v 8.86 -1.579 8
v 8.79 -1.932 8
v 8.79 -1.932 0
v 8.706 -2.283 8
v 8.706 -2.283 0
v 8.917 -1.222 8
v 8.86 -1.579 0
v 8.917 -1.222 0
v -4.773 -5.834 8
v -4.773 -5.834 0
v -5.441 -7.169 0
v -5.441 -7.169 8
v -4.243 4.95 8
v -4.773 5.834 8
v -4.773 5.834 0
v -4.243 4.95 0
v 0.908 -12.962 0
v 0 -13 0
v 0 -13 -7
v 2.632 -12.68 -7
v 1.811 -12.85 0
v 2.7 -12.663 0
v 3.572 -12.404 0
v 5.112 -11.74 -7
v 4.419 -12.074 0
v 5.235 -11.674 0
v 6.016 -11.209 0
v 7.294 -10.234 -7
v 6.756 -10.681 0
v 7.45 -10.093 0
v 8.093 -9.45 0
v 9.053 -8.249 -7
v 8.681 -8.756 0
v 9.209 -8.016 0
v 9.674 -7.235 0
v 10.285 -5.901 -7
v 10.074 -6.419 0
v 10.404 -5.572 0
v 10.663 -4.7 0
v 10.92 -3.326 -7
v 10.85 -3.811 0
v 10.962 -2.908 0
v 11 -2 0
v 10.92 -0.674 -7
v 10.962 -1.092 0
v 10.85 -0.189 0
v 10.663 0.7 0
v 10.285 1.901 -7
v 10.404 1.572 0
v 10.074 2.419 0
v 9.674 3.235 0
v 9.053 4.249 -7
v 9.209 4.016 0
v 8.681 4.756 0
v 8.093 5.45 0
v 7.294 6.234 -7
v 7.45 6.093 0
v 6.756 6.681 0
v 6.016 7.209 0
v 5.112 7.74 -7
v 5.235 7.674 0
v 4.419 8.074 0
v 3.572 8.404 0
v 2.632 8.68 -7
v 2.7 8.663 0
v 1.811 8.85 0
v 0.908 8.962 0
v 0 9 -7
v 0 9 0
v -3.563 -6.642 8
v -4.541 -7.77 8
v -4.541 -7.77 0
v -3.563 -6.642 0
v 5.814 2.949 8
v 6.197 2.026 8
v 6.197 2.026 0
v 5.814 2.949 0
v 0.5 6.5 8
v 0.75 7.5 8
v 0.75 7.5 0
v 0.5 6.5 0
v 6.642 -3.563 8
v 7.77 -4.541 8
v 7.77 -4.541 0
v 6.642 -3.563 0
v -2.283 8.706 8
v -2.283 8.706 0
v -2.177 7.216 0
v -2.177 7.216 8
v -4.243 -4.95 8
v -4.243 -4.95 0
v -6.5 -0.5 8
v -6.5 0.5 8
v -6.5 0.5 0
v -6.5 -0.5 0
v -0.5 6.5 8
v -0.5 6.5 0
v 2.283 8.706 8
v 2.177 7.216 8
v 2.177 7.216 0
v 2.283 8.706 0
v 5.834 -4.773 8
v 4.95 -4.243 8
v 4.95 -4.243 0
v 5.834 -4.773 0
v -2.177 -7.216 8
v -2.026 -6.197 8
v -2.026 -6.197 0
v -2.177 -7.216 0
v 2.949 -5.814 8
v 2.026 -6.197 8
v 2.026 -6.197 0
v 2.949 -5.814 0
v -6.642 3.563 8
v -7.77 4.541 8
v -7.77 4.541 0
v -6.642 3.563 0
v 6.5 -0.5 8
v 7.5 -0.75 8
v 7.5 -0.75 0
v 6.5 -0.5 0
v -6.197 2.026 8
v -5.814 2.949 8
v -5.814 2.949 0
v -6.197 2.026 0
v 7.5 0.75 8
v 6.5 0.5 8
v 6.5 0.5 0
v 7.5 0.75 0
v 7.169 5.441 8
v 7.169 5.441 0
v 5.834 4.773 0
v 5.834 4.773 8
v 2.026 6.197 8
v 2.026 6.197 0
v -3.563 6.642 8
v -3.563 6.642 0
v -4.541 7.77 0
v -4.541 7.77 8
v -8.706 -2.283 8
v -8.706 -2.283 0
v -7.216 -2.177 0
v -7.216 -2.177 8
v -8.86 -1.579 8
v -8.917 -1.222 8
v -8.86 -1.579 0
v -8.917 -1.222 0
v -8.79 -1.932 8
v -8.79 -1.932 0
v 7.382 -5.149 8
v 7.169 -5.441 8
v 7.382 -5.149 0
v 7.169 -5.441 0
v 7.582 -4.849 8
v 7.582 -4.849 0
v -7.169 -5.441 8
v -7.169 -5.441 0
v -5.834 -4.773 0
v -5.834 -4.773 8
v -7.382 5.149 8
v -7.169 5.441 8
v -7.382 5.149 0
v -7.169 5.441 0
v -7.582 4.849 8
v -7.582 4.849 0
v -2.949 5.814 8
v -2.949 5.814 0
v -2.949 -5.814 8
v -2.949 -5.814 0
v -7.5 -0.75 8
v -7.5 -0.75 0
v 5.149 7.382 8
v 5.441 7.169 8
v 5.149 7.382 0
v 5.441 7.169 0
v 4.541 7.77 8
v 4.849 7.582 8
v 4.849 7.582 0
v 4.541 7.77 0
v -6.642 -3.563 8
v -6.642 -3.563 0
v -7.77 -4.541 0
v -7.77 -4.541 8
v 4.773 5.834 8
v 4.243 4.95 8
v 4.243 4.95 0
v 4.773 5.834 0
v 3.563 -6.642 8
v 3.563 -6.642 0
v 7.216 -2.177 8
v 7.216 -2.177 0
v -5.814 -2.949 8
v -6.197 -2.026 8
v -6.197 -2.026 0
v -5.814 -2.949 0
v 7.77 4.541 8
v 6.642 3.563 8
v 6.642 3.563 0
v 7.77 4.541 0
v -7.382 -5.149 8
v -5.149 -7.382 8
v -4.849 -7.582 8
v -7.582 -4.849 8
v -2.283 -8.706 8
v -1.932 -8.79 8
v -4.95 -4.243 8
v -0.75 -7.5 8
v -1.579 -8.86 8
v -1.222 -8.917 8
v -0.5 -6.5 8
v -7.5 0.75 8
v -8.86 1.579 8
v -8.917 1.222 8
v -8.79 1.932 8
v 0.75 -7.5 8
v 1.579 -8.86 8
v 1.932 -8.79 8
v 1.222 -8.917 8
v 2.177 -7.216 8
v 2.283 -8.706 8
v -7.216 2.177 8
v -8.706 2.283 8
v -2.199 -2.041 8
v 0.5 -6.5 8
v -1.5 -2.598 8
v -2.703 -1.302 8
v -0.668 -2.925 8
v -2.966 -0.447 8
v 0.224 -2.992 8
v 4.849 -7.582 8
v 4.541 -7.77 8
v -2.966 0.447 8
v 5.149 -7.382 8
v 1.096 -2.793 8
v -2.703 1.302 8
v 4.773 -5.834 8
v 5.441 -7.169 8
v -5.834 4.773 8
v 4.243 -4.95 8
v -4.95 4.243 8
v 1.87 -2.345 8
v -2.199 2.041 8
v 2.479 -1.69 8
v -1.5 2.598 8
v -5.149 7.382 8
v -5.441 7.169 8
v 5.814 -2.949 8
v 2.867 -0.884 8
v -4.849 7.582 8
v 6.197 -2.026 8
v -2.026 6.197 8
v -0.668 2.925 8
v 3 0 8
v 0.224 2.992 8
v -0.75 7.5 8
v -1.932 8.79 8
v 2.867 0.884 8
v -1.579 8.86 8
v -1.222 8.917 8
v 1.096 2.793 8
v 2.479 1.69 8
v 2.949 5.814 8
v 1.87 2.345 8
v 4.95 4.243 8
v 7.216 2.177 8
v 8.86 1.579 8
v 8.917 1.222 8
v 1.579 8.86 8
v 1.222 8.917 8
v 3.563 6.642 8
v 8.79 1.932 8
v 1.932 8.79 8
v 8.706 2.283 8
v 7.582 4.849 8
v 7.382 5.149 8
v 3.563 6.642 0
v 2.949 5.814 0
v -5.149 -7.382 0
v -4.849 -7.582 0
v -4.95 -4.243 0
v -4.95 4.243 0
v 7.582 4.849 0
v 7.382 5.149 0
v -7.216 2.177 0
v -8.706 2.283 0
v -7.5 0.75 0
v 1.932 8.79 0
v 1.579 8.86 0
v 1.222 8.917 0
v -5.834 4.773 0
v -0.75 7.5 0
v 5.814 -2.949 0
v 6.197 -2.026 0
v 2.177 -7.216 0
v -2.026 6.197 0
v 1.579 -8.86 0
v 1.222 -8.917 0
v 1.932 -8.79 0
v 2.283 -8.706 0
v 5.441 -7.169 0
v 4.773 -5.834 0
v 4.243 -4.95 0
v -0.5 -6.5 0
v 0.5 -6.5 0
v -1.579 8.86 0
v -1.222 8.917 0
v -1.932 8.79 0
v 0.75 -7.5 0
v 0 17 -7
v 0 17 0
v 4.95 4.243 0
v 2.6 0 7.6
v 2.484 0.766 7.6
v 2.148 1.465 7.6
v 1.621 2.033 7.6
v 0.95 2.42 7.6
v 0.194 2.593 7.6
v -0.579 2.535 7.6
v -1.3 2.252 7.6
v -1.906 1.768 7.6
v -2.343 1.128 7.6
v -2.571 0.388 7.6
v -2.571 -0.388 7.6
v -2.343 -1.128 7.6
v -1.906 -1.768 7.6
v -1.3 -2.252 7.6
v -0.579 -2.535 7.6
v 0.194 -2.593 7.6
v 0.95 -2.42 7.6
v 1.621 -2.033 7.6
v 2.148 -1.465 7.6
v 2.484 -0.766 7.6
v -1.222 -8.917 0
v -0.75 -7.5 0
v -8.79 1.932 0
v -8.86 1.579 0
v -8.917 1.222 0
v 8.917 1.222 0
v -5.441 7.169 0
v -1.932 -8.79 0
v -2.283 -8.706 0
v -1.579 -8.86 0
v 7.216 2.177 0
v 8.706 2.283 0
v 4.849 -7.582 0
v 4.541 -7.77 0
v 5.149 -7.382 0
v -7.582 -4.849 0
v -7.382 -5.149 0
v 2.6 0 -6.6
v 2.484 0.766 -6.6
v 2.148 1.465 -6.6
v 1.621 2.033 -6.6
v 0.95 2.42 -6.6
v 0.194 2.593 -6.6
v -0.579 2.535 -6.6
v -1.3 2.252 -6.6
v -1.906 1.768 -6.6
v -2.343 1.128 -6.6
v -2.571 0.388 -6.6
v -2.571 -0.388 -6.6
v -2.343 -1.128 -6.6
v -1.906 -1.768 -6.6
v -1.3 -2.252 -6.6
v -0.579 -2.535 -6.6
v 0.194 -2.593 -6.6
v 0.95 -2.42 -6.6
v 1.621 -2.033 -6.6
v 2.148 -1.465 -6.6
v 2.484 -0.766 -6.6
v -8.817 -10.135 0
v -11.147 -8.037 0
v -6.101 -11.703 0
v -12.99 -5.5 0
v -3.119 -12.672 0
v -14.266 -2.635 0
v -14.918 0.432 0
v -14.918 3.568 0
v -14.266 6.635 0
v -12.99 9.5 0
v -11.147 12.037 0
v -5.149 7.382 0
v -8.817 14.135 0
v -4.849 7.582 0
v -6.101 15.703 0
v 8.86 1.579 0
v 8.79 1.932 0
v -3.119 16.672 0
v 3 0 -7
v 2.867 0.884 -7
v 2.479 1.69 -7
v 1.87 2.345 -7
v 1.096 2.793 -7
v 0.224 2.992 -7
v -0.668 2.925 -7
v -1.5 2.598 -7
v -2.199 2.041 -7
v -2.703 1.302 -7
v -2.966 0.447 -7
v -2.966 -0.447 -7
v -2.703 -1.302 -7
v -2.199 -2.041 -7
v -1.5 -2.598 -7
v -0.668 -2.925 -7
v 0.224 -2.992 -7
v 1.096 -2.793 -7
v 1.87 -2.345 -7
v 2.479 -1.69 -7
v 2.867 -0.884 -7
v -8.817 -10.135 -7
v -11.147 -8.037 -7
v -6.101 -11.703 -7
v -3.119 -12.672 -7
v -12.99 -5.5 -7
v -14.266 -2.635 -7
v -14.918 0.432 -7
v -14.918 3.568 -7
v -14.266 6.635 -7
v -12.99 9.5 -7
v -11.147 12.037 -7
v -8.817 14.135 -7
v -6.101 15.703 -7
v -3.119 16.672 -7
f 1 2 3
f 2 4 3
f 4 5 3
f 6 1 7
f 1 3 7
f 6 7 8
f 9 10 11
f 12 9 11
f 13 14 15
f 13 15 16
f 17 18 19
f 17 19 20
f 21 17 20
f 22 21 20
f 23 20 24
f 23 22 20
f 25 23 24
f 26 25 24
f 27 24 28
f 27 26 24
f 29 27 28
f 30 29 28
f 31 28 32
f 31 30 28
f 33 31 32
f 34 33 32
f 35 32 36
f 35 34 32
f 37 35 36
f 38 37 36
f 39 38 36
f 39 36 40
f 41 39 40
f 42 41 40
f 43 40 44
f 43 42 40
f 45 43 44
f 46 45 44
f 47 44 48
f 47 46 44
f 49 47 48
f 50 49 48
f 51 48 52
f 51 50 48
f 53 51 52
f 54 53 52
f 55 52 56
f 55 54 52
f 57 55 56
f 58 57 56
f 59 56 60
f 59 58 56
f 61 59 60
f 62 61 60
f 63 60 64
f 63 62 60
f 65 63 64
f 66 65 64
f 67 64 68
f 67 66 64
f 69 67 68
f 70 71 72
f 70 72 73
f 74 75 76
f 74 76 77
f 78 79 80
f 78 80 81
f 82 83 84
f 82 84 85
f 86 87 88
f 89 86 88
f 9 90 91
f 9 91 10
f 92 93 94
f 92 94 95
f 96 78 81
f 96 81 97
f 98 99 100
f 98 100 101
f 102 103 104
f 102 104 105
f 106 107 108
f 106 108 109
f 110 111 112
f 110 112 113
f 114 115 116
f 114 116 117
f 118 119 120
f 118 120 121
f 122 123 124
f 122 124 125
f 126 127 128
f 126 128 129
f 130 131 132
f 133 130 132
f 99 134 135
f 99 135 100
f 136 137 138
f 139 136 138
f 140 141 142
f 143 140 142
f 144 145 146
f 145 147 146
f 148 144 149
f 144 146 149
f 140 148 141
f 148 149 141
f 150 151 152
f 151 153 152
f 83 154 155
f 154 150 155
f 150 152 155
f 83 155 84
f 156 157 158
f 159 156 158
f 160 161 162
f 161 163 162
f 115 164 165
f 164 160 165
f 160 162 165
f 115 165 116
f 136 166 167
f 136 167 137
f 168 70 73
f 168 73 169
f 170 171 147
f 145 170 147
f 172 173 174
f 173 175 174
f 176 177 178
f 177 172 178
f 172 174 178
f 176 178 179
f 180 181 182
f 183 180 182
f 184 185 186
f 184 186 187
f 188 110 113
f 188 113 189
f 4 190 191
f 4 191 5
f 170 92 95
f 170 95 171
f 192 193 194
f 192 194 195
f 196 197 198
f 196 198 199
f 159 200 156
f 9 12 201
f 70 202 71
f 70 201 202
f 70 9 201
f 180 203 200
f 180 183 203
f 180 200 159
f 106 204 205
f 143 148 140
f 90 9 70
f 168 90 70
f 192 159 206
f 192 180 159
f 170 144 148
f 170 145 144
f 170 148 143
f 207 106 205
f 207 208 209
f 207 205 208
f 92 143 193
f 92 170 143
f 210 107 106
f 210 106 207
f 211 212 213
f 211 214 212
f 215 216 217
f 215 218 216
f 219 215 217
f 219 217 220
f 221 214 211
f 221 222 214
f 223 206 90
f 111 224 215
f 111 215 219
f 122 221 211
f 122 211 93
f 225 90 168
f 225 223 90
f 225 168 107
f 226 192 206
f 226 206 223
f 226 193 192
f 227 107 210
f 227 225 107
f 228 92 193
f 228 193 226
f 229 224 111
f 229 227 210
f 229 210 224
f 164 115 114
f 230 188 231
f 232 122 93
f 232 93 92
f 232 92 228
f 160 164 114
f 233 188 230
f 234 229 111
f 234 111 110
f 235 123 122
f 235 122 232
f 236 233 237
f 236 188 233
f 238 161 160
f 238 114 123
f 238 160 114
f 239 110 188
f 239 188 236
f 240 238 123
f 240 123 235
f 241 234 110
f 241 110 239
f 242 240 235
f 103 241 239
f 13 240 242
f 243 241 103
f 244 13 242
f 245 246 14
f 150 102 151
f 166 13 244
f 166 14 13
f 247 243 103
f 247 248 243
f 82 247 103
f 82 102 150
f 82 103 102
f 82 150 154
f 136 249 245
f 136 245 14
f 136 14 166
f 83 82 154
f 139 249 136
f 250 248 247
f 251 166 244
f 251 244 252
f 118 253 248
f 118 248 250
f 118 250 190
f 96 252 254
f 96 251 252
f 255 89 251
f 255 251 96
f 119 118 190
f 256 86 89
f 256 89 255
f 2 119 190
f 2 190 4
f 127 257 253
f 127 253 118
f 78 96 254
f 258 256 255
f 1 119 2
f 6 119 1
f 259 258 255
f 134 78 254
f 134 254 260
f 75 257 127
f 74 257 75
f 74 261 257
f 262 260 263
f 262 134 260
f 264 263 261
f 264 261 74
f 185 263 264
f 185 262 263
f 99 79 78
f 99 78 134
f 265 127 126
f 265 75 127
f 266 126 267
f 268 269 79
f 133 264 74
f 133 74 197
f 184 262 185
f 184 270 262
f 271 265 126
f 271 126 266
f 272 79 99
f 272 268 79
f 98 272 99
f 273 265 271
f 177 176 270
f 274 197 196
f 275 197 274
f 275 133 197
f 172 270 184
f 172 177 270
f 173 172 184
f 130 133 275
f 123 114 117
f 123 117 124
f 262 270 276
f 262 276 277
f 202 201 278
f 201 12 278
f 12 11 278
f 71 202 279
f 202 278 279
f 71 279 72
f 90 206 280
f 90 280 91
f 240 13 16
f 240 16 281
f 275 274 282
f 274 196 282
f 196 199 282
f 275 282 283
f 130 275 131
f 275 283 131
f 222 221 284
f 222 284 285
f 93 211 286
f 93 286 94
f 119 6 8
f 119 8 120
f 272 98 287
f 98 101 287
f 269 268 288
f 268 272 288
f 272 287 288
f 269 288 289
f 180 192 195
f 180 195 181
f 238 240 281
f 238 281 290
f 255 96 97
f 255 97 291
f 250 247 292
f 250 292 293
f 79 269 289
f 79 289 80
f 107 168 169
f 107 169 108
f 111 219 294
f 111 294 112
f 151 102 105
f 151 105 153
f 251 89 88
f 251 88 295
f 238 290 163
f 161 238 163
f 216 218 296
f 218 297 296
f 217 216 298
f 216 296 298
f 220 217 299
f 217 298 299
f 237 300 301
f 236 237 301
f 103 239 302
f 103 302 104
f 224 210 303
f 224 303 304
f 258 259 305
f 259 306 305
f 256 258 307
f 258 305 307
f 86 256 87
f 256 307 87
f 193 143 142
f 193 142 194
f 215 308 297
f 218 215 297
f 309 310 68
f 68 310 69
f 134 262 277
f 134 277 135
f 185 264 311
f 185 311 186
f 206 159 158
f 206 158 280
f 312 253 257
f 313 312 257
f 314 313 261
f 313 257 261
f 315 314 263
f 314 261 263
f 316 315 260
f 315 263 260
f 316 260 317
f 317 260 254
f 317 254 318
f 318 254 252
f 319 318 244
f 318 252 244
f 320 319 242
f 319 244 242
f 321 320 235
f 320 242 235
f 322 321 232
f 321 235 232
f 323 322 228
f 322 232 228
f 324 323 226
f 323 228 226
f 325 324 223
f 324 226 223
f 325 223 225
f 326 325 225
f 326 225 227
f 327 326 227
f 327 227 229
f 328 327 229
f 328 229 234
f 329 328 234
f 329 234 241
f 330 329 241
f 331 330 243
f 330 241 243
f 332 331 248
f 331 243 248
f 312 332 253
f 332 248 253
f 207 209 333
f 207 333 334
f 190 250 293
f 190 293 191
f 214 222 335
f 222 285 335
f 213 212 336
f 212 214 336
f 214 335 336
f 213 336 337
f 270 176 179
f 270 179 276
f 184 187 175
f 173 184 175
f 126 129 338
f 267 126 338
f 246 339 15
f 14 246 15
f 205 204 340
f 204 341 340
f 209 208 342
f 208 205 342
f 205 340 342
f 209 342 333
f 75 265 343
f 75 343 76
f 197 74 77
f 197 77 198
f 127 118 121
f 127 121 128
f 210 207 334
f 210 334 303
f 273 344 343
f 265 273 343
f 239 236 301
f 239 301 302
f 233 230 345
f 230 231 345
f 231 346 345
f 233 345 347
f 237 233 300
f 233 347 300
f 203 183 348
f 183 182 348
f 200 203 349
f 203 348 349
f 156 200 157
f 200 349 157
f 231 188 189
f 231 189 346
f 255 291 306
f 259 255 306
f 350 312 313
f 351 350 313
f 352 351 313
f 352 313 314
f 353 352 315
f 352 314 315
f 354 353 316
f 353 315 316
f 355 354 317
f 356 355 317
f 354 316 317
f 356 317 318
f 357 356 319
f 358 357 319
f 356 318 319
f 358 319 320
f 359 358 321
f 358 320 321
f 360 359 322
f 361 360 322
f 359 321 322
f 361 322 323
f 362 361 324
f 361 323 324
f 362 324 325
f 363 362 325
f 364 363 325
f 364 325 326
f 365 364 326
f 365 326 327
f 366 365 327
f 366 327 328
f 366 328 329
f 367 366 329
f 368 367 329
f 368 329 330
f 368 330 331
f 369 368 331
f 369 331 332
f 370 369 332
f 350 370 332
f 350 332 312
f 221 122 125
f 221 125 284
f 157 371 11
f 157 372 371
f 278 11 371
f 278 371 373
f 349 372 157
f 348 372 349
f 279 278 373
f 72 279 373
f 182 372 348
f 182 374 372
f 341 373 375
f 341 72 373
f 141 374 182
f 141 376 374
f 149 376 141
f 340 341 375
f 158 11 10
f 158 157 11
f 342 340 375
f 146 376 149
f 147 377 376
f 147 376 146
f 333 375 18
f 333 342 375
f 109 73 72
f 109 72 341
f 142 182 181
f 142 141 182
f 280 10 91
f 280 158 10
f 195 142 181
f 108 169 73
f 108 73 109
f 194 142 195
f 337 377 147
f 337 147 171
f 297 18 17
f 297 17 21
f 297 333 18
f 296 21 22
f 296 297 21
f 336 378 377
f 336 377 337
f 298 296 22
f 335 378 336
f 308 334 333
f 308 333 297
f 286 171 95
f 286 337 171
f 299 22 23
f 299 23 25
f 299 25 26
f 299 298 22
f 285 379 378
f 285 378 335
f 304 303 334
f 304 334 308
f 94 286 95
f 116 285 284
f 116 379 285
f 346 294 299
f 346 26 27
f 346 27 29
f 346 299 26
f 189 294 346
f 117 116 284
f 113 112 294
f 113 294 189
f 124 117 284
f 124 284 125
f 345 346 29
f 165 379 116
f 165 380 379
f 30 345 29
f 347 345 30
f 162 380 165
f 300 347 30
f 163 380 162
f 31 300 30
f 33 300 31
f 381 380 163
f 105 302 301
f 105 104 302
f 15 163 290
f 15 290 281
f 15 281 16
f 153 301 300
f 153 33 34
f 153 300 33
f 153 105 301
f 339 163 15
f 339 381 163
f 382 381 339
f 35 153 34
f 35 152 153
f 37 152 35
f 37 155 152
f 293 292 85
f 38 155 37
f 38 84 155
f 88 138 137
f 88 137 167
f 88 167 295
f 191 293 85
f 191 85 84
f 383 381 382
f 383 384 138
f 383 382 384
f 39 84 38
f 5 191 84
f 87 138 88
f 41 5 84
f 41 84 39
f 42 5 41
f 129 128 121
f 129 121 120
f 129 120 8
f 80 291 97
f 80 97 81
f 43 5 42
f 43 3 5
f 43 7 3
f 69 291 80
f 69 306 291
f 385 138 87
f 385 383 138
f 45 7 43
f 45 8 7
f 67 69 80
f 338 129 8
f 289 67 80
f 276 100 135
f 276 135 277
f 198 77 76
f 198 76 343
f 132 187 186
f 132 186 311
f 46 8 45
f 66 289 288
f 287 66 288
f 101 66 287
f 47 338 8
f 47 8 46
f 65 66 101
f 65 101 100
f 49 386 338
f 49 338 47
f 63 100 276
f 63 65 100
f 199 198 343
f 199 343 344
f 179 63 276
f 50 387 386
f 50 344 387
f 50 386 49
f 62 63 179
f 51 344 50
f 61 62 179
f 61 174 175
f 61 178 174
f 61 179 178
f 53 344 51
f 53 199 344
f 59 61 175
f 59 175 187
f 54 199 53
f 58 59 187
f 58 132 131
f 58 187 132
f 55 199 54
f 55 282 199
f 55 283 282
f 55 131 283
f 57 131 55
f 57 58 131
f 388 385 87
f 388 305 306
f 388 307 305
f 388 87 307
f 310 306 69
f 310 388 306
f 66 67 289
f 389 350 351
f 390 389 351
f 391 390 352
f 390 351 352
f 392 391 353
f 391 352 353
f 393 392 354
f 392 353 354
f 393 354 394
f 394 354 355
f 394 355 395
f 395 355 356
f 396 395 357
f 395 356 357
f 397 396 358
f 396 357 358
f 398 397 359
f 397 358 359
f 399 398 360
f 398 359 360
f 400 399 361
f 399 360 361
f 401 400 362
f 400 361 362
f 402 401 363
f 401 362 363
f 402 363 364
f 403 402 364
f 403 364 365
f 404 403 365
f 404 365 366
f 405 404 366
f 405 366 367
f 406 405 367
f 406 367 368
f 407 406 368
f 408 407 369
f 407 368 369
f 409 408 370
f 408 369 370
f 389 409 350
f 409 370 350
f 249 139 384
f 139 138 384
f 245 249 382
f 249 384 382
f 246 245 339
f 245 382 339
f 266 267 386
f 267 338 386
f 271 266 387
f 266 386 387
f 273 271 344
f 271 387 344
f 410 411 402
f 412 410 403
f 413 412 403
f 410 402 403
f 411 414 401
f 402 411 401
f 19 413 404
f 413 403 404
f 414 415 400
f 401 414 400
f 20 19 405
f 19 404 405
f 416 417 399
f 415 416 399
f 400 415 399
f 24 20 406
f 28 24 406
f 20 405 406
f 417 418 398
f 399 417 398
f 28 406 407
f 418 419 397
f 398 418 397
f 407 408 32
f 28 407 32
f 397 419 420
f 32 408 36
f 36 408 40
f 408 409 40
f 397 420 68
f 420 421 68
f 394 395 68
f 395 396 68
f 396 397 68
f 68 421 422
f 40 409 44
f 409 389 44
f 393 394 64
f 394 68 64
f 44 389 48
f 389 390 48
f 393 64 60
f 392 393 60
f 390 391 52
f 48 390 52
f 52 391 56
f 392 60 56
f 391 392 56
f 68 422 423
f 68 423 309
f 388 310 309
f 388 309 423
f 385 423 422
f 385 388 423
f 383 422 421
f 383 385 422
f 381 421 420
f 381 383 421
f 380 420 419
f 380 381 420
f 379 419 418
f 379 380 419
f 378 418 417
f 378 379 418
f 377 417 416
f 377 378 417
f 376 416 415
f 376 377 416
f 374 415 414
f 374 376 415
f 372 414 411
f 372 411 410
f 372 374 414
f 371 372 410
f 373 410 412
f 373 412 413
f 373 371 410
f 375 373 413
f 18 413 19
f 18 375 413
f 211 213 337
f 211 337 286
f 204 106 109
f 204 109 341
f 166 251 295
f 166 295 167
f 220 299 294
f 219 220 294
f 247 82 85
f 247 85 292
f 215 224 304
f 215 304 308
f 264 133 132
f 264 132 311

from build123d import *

# Parameters (mm, degrees)
PAD_DEPTH          = 7
SKETCH001_R        = 9
PAD001_DEPTH       = 8
POCKET_DEPTH       = 8
SKETCH003_R        = 2.6
POCKET001_DEPTH    = 16
POLARPATTERN_COUNT = 16
CHAMFER_SIZE       = 0.4


with BuildPart() as part:
    # Sketch → Pad (new body)
    with BuildSketch(Plane.XY):
        with BuildLine():
            ThreePointArc((0, -13), (11, -2), (0, 9))
            Line((0, 17), (0, 9))
            ThreePointArc((0, 17), (-15, 2), (0, -13))
        make_face()
    extrude(amount=-PAD_DEPTH)

    # Sketch001 (on Face4 of Pad) → Pad001 (join)
    with BuildSketch(Plane.XY):
        Circle(SKETCH001_R)
    extrude(amount=PAD001_DEPTH)

    # Sketch002 (on Face7 of Pad001) → Pocket (cut)
    with BuildSketch(Plane.XY.offset(8)):
        Polygon((1.25, 9), (0.75, 7.5), (0.5, 6.5), (-0.5, 6.5), (-0.75, 7.5), (-1.25, 9), align=None)
    pocket = extrude(amount=-POCKET_DEPTH, mode=Mode.SUBTRACT)

    # Sketch003 (on Face7 of Pad001) → Pocket001 (cut)
    with BuildSketch(Plane.XY.offset(8)):
        Circle(SKETCH003_R)
    extrude(amount=-POCKET001_DEPTH, mode=Mode.SUBTRACT)

    # PolarPattern: Pocket ×16 about axis
    polarpattern_axis = Axis((0, 0, 8), (0, 0, 1))
    for i in range(1, POLARPATTERN_COUNT):
        add(pocket.rotate(polarpattern_axis, i * 360 / POLARPATTERN_COUNT), mode=Mode.SUBTRACT)

    # Chamfer
    chamfer_edges = [part.edges().sort_by_distance(p)[0] for p in [
        (-2.6, 0, 8),
        (-2.6, 0, -7),
    ]]
    chamfer(chamfer_edges, length=CHAMFER_SIZE)


solid = part.part
